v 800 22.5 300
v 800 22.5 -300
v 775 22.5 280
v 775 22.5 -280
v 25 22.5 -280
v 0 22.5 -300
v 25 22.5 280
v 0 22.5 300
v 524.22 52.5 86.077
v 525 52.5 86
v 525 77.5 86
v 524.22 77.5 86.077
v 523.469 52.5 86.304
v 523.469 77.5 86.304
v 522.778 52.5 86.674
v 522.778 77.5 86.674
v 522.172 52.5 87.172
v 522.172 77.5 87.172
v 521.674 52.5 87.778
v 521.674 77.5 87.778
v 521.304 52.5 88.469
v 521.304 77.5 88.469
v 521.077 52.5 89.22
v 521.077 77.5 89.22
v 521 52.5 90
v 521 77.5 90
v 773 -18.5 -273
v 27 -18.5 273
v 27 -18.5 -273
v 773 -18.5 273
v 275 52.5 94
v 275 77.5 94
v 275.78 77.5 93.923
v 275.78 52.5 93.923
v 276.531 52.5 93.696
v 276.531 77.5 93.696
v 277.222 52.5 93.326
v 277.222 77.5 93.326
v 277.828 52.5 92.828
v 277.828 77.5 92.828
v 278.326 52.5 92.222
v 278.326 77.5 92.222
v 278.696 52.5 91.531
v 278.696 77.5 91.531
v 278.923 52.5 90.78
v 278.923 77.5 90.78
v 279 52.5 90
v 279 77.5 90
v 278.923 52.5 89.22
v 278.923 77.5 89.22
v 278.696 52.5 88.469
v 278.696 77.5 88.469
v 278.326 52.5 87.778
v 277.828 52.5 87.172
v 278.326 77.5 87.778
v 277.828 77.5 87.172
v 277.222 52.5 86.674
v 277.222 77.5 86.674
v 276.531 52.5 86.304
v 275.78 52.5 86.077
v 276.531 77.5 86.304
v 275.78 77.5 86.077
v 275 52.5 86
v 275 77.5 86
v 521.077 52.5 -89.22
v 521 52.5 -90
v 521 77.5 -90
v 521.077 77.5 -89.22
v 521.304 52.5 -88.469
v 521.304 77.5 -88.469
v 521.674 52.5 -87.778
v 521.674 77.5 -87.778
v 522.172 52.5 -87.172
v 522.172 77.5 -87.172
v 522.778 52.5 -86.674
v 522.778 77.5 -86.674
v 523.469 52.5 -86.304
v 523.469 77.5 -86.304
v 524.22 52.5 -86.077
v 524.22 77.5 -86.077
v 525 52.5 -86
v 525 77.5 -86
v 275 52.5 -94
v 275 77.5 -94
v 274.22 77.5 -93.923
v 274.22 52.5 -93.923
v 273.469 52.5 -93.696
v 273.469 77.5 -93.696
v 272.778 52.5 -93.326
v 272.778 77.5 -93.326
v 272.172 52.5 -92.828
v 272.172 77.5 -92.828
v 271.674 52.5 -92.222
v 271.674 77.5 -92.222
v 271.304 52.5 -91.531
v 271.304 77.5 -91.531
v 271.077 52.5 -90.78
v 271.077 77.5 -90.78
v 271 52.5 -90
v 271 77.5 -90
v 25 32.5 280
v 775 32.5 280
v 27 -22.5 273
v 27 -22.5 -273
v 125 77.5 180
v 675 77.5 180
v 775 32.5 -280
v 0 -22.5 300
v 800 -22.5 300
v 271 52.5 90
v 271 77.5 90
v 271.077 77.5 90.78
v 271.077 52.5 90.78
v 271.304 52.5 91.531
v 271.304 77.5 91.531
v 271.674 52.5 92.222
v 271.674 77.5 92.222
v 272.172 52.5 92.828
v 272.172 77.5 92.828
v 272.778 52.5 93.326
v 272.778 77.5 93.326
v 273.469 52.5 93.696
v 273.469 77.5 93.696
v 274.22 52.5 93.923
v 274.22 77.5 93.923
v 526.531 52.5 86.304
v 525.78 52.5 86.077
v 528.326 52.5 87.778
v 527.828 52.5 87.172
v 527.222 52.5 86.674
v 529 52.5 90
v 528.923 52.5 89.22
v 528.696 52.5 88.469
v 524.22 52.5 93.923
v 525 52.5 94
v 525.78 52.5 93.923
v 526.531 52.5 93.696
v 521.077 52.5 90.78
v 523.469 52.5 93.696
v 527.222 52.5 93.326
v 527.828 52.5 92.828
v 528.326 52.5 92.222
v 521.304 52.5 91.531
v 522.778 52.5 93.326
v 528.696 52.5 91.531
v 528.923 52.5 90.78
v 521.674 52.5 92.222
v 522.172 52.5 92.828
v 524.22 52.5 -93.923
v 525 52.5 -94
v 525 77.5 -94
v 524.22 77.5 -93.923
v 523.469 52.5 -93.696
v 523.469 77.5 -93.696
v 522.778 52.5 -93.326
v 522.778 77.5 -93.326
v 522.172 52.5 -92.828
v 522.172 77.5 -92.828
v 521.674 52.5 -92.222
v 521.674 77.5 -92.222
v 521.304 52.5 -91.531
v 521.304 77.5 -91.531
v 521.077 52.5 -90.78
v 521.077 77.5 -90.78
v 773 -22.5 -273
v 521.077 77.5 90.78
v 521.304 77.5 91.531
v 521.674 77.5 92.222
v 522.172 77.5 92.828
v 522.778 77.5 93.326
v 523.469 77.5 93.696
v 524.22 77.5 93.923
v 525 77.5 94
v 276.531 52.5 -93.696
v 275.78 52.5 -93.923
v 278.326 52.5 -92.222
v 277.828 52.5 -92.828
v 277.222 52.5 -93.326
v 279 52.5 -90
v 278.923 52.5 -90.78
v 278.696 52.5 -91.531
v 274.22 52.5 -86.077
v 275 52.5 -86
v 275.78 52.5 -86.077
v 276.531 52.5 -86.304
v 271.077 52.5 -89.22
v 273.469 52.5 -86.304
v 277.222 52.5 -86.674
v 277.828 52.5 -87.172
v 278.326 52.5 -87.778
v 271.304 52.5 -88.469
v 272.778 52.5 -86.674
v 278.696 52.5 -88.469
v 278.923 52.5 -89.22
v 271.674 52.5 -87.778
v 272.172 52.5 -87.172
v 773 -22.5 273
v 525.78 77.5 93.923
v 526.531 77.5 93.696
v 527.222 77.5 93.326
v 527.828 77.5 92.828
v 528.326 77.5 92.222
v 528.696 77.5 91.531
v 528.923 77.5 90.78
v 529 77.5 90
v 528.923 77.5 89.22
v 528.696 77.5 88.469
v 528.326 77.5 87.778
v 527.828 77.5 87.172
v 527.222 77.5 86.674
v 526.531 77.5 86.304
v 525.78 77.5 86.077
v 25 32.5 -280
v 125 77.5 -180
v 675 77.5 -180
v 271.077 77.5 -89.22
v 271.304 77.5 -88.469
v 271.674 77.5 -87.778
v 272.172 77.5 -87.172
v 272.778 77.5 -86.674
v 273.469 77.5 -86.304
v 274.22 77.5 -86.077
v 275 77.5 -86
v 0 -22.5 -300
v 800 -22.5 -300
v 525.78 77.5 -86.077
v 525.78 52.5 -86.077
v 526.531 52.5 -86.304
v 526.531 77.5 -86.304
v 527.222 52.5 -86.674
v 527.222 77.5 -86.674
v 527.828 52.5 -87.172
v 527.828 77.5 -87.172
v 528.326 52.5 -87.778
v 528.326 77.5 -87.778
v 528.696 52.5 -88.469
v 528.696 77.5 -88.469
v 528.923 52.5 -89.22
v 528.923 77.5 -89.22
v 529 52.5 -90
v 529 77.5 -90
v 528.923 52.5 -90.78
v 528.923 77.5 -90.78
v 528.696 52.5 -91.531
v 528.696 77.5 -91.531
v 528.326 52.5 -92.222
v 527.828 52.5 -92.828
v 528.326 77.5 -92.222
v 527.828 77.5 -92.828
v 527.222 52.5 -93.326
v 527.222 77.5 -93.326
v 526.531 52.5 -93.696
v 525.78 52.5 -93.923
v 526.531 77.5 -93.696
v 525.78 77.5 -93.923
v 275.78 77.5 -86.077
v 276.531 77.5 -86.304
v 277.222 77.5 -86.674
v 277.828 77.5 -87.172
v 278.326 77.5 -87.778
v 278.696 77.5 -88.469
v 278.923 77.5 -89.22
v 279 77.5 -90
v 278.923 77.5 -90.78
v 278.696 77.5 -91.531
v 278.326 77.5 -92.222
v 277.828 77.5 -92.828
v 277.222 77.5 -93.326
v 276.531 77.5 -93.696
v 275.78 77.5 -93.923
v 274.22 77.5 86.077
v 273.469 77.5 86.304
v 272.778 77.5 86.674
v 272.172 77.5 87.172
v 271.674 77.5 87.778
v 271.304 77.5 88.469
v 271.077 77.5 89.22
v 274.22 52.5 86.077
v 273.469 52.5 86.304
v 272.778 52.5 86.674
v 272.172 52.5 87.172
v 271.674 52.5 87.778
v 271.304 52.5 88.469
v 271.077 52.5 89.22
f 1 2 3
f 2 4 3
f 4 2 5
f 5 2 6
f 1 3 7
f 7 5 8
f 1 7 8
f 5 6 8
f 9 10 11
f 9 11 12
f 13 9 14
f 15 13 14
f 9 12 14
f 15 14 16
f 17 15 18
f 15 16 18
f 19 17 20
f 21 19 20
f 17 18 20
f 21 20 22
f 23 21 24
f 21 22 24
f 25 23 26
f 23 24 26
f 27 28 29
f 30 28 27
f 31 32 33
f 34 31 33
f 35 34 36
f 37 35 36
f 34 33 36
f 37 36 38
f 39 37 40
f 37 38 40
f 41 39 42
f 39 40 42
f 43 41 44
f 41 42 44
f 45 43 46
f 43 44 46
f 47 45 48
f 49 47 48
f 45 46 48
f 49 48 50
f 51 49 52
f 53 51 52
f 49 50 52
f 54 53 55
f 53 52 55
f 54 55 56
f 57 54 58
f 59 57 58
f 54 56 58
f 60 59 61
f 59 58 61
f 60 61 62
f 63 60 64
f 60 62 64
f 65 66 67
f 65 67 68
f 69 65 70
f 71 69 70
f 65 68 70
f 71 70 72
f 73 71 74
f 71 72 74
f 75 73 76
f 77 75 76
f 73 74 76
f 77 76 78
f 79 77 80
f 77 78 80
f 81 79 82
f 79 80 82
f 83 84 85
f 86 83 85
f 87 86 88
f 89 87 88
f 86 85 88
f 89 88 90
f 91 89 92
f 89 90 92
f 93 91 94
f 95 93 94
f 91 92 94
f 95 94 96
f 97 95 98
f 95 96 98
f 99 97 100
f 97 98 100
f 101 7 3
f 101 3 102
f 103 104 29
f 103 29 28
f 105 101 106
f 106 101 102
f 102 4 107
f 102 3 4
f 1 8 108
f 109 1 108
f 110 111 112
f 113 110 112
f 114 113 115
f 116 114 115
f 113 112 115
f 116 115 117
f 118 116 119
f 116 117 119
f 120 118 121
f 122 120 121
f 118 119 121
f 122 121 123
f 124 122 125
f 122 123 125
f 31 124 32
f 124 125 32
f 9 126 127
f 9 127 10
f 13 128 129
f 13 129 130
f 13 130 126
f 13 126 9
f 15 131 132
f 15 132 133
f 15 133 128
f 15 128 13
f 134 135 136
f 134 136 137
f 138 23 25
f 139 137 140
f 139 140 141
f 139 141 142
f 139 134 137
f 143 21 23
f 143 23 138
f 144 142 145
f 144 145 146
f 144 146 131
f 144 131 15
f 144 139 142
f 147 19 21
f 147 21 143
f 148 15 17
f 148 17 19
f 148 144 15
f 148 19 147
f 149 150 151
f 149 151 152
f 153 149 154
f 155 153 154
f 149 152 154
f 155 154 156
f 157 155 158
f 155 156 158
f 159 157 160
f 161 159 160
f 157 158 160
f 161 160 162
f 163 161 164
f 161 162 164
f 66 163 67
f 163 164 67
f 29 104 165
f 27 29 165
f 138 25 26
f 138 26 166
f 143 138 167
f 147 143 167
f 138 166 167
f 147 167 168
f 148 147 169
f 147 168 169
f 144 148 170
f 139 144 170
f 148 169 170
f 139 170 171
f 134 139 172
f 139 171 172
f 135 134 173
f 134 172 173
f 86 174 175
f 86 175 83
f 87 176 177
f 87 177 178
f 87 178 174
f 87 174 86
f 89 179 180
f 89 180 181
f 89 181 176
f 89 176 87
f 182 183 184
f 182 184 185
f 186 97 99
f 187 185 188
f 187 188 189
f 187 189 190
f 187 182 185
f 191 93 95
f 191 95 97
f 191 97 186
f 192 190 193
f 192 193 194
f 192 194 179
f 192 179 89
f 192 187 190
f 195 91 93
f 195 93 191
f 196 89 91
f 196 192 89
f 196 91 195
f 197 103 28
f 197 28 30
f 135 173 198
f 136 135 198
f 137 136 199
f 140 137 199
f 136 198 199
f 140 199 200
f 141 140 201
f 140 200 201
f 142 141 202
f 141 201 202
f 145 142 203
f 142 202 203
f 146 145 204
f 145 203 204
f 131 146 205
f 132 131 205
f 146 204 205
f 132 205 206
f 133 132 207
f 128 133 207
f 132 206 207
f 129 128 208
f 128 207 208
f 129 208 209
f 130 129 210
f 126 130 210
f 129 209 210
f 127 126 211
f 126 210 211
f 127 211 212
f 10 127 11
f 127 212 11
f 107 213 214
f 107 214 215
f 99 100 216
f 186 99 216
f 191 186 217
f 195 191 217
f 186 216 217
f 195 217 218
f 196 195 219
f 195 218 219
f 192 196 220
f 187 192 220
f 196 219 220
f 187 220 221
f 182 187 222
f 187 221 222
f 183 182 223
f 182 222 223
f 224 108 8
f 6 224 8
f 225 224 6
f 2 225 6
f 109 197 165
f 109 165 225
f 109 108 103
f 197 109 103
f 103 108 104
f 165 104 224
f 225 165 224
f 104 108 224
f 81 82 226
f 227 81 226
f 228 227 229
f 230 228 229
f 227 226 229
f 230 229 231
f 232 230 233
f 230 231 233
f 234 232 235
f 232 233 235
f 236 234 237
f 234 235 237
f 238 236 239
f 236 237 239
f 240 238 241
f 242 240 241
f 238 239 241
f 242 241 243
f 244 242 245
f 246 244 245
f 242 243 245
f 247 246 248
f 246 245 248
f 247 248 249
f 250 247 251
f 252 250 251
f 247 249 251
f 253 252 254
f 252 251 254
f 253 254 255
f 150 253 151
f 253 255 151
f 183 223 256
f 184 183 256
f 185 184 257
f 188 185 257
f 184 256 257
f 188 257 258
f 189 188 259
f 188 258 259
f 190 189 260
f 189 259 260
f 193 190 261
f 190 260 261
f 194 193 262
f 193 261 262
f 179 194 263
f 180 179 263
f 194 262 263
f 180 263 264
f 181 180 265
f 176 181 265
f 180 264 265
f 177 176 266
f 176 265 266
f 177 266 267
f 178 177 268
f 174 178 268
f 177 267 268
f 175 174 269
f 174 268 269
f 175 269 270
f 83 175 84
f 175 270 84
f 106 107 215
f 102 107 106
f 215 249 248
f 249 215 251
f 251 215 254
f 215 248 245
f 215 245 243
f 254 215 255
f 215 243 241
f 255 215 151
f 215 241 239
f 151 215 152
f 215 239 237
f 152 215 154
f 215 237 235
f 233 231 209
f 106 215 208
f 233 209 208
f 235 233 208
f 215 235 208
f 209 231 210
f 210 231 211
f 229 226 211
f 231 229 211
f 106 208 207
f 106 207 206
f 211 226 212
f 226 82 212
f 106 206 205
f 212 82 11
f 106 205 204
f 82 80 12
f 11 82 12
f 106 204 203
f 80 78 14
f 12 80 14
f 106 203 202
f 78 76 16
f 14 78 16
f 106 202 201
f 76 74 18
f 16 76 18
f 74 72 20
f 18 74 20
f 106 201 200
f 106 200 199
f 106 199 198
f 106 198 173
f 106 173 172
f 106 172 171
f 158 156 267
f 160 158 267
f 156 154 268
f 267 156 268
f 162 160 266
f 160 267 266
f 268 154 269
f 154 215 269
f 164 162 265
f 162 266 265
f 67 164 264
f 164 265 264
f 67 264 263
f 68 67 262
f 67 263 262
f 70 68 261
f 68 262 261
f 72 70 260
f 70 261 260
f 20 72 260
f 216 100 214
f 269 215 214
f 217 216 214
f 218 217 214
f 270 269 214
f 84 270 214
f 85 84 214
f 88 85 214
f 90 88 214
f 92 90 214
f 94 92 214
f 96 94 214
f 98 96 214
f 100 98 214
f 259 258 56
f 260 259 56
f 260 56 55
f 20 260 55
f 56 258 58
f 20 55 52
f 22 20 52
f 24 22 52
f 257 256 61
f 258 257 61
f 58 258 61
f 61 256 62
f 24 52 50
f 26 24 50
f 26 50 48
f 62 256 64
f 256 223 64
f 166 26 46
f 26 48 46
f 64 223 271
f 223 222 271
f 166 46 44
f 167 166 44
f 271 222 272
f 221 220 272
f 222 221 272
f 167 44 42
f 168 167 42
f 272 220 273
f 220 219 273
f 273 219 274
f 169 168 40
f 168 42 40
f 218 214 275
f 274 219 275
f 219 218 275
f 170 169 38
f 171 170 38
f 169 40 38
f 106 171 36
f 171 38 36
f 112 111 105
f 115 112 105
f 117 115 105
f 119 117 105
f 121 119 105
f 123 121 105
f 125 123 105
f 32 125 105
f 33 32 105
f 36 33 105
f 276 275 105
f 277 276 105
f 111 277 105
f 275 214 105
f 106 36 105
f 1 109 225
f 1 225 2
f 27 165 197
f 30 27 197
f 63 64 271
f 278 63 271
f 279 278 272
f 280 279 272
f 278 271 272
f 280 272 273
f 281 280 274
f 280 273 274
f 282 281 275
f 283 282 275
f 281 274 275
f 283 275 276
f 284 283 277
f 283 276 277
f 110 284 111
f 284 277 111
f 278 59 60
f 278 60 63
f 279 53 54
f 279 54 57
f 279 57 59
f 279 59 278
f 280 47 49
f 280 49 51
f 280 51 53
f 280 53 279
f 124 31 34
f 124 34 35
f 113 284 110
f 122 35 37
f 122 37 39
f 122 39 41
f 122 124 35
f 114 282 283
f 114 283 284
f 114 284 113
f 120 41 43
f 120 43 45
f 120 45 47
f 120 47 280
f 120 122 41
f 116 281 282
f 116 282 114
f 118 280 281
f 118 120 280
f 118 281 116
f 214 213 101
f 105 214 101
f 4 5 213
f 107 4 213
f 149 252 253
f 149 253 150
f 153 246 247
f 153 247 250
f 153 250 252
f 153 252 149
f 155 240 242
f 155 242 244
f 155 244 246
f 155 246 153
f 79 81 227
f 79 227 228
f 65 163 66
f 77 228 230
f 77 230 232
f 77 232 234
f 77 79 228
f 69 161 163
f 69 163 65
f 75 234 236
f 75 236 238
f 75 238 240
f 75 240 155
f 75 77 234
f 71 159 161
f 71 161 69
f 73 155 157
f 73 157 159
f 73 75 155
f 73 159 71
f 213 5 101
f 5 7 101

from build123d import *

# Parameters (mm, degrees)
F0_W     = 55
F0_H     = 560
F1_DEPTH = 800
F2_W     = 55
F2_H     = 560
F3_DEPTH = 25
F4_SIZE2 = 45
F4_SIZE  = 100
F5_W     = 746
F5_H     = 546
F6_DEPTH = 4
F8_DEPTH = 25


with BuildPart() as f1:
    # F0 (on Right) → F1 (new body)
    with BuildSketch(Plane.YZ):
        Polygon((22.5, 300), (-22.5, 300), (-22.5, -300), (22.5, -300), (22.5, -280), (22.5, 280), align=None)
        with Locations((50, 0)):
            Rectangle(F0_W, F0_H)
    extrude(amount=F1_DEPTH)

    # F2 (on face) + F0 (on Right) → F3 (cut, symmetric)
    with BuildSketch(Plane.YZ.offset(800)):
        with Locations((50, 0)):
            Rectangle(F2_W, F2_H)
    with BuildSketch(Plane.YZ):
        with Locations((50, 0)):
            Rectangle(F0_W, F0_H)
    extrude(amount=F3_DEPTH, both=True, mode=Mode.SUBTRACT)

    # F4
    f4_edges = [f1.edges().sort_by_distance(p)[0] for p in [
        (25, 77.5, 0),
        (400, 77.5, 280),
        (775, 77.5, 0),
        (400, 77.5, -280),
    ]]
    f4_side = f1.faces().sort_by_distance((400, 77.5, 0))[0]
    chamfer(f4_edges, length=F4_SIZE, length2=F4_SIZE2, reference=f4_side)

    # F5 (on face) → F6 (cut)
    with BuildSketch(Plane.XZ.offset(22.5)):
        with Locations((400, 0)):
            Rectangle(F5_W, F5_H)
    extrude(amount=-F6_DEPTH, mode=Mode.SUBTRACT)

    # F7 (on face) → F8 (cut)
    with BuildSketch(Plane(origin=(0, 77.5, 0), x_dir=(-1, 0, 0), z_dir=(0, 1, 0))):
        with BuildLine():
            ThreePointArc((-525, 94), (-529, 90), (-525, 86))
            Line((-525, 86), (-525, 94))
        make_face()
        with BuildLine():
            Line((-525, 94), (-525, 86))
            ThreePointArc((-525, 86), (-522.1715728753, 87.1715728753), (-521, 90))
            ThreePointArc((-521, 90), (-522.1715728753, 92.8284271247), (-525, 94))
        make_face()
        with BuildLine():
            ThreePointArc((-525, -86), (-529, -90), (-525, -94))
            Line((-525, -94), (-525, -86))
        make_face()
        with BuildLine():
            Line((-525, -86), (-525, -94))
            ThreePointArc((-525, -94), (-522.1715728753, -92.8284271247), (-521, -90))
            ThreePointArc((-521, -90), (-522.1715728753, -87.1715728753), (-525, -86))
        make_face()
        with BuildLine():
            ThreePointArc((-275, -86), (-279, -90), (-275, -94))
            Line((-275, -94), (-275, -86))
        make_face()
        with BuildLine():
            Line((-275, -86), (-275, -94))
            ThreePointArc((-275, -94), (-272.1715728753, -92.8284271247), (-271, -90))
            ThreePointArc((-271, -90), (-272.1715728753, -87.1715728753), (-275, -86))
        make_face()
        with BuildLine():
            ThreePointArc((-275, 94), (-279, 90), (-275, 86))
            Line((-275, 86), (-275, 94))
        make_face()
        with BuildLine():
            Line((-275, 94), (-275, 86))
            ThreePointArc((-275, 86), (-272.1715728753, 87.1715728753), (-271, 90))
            ThreePointArc((-271, 90), (-272.1715728753, 92.8284271247), (-275, 94))
        make_face()
    extrude(amount=-F8_DEPTH, mode=Mode.SUBTRACT)


solid = f1.part
